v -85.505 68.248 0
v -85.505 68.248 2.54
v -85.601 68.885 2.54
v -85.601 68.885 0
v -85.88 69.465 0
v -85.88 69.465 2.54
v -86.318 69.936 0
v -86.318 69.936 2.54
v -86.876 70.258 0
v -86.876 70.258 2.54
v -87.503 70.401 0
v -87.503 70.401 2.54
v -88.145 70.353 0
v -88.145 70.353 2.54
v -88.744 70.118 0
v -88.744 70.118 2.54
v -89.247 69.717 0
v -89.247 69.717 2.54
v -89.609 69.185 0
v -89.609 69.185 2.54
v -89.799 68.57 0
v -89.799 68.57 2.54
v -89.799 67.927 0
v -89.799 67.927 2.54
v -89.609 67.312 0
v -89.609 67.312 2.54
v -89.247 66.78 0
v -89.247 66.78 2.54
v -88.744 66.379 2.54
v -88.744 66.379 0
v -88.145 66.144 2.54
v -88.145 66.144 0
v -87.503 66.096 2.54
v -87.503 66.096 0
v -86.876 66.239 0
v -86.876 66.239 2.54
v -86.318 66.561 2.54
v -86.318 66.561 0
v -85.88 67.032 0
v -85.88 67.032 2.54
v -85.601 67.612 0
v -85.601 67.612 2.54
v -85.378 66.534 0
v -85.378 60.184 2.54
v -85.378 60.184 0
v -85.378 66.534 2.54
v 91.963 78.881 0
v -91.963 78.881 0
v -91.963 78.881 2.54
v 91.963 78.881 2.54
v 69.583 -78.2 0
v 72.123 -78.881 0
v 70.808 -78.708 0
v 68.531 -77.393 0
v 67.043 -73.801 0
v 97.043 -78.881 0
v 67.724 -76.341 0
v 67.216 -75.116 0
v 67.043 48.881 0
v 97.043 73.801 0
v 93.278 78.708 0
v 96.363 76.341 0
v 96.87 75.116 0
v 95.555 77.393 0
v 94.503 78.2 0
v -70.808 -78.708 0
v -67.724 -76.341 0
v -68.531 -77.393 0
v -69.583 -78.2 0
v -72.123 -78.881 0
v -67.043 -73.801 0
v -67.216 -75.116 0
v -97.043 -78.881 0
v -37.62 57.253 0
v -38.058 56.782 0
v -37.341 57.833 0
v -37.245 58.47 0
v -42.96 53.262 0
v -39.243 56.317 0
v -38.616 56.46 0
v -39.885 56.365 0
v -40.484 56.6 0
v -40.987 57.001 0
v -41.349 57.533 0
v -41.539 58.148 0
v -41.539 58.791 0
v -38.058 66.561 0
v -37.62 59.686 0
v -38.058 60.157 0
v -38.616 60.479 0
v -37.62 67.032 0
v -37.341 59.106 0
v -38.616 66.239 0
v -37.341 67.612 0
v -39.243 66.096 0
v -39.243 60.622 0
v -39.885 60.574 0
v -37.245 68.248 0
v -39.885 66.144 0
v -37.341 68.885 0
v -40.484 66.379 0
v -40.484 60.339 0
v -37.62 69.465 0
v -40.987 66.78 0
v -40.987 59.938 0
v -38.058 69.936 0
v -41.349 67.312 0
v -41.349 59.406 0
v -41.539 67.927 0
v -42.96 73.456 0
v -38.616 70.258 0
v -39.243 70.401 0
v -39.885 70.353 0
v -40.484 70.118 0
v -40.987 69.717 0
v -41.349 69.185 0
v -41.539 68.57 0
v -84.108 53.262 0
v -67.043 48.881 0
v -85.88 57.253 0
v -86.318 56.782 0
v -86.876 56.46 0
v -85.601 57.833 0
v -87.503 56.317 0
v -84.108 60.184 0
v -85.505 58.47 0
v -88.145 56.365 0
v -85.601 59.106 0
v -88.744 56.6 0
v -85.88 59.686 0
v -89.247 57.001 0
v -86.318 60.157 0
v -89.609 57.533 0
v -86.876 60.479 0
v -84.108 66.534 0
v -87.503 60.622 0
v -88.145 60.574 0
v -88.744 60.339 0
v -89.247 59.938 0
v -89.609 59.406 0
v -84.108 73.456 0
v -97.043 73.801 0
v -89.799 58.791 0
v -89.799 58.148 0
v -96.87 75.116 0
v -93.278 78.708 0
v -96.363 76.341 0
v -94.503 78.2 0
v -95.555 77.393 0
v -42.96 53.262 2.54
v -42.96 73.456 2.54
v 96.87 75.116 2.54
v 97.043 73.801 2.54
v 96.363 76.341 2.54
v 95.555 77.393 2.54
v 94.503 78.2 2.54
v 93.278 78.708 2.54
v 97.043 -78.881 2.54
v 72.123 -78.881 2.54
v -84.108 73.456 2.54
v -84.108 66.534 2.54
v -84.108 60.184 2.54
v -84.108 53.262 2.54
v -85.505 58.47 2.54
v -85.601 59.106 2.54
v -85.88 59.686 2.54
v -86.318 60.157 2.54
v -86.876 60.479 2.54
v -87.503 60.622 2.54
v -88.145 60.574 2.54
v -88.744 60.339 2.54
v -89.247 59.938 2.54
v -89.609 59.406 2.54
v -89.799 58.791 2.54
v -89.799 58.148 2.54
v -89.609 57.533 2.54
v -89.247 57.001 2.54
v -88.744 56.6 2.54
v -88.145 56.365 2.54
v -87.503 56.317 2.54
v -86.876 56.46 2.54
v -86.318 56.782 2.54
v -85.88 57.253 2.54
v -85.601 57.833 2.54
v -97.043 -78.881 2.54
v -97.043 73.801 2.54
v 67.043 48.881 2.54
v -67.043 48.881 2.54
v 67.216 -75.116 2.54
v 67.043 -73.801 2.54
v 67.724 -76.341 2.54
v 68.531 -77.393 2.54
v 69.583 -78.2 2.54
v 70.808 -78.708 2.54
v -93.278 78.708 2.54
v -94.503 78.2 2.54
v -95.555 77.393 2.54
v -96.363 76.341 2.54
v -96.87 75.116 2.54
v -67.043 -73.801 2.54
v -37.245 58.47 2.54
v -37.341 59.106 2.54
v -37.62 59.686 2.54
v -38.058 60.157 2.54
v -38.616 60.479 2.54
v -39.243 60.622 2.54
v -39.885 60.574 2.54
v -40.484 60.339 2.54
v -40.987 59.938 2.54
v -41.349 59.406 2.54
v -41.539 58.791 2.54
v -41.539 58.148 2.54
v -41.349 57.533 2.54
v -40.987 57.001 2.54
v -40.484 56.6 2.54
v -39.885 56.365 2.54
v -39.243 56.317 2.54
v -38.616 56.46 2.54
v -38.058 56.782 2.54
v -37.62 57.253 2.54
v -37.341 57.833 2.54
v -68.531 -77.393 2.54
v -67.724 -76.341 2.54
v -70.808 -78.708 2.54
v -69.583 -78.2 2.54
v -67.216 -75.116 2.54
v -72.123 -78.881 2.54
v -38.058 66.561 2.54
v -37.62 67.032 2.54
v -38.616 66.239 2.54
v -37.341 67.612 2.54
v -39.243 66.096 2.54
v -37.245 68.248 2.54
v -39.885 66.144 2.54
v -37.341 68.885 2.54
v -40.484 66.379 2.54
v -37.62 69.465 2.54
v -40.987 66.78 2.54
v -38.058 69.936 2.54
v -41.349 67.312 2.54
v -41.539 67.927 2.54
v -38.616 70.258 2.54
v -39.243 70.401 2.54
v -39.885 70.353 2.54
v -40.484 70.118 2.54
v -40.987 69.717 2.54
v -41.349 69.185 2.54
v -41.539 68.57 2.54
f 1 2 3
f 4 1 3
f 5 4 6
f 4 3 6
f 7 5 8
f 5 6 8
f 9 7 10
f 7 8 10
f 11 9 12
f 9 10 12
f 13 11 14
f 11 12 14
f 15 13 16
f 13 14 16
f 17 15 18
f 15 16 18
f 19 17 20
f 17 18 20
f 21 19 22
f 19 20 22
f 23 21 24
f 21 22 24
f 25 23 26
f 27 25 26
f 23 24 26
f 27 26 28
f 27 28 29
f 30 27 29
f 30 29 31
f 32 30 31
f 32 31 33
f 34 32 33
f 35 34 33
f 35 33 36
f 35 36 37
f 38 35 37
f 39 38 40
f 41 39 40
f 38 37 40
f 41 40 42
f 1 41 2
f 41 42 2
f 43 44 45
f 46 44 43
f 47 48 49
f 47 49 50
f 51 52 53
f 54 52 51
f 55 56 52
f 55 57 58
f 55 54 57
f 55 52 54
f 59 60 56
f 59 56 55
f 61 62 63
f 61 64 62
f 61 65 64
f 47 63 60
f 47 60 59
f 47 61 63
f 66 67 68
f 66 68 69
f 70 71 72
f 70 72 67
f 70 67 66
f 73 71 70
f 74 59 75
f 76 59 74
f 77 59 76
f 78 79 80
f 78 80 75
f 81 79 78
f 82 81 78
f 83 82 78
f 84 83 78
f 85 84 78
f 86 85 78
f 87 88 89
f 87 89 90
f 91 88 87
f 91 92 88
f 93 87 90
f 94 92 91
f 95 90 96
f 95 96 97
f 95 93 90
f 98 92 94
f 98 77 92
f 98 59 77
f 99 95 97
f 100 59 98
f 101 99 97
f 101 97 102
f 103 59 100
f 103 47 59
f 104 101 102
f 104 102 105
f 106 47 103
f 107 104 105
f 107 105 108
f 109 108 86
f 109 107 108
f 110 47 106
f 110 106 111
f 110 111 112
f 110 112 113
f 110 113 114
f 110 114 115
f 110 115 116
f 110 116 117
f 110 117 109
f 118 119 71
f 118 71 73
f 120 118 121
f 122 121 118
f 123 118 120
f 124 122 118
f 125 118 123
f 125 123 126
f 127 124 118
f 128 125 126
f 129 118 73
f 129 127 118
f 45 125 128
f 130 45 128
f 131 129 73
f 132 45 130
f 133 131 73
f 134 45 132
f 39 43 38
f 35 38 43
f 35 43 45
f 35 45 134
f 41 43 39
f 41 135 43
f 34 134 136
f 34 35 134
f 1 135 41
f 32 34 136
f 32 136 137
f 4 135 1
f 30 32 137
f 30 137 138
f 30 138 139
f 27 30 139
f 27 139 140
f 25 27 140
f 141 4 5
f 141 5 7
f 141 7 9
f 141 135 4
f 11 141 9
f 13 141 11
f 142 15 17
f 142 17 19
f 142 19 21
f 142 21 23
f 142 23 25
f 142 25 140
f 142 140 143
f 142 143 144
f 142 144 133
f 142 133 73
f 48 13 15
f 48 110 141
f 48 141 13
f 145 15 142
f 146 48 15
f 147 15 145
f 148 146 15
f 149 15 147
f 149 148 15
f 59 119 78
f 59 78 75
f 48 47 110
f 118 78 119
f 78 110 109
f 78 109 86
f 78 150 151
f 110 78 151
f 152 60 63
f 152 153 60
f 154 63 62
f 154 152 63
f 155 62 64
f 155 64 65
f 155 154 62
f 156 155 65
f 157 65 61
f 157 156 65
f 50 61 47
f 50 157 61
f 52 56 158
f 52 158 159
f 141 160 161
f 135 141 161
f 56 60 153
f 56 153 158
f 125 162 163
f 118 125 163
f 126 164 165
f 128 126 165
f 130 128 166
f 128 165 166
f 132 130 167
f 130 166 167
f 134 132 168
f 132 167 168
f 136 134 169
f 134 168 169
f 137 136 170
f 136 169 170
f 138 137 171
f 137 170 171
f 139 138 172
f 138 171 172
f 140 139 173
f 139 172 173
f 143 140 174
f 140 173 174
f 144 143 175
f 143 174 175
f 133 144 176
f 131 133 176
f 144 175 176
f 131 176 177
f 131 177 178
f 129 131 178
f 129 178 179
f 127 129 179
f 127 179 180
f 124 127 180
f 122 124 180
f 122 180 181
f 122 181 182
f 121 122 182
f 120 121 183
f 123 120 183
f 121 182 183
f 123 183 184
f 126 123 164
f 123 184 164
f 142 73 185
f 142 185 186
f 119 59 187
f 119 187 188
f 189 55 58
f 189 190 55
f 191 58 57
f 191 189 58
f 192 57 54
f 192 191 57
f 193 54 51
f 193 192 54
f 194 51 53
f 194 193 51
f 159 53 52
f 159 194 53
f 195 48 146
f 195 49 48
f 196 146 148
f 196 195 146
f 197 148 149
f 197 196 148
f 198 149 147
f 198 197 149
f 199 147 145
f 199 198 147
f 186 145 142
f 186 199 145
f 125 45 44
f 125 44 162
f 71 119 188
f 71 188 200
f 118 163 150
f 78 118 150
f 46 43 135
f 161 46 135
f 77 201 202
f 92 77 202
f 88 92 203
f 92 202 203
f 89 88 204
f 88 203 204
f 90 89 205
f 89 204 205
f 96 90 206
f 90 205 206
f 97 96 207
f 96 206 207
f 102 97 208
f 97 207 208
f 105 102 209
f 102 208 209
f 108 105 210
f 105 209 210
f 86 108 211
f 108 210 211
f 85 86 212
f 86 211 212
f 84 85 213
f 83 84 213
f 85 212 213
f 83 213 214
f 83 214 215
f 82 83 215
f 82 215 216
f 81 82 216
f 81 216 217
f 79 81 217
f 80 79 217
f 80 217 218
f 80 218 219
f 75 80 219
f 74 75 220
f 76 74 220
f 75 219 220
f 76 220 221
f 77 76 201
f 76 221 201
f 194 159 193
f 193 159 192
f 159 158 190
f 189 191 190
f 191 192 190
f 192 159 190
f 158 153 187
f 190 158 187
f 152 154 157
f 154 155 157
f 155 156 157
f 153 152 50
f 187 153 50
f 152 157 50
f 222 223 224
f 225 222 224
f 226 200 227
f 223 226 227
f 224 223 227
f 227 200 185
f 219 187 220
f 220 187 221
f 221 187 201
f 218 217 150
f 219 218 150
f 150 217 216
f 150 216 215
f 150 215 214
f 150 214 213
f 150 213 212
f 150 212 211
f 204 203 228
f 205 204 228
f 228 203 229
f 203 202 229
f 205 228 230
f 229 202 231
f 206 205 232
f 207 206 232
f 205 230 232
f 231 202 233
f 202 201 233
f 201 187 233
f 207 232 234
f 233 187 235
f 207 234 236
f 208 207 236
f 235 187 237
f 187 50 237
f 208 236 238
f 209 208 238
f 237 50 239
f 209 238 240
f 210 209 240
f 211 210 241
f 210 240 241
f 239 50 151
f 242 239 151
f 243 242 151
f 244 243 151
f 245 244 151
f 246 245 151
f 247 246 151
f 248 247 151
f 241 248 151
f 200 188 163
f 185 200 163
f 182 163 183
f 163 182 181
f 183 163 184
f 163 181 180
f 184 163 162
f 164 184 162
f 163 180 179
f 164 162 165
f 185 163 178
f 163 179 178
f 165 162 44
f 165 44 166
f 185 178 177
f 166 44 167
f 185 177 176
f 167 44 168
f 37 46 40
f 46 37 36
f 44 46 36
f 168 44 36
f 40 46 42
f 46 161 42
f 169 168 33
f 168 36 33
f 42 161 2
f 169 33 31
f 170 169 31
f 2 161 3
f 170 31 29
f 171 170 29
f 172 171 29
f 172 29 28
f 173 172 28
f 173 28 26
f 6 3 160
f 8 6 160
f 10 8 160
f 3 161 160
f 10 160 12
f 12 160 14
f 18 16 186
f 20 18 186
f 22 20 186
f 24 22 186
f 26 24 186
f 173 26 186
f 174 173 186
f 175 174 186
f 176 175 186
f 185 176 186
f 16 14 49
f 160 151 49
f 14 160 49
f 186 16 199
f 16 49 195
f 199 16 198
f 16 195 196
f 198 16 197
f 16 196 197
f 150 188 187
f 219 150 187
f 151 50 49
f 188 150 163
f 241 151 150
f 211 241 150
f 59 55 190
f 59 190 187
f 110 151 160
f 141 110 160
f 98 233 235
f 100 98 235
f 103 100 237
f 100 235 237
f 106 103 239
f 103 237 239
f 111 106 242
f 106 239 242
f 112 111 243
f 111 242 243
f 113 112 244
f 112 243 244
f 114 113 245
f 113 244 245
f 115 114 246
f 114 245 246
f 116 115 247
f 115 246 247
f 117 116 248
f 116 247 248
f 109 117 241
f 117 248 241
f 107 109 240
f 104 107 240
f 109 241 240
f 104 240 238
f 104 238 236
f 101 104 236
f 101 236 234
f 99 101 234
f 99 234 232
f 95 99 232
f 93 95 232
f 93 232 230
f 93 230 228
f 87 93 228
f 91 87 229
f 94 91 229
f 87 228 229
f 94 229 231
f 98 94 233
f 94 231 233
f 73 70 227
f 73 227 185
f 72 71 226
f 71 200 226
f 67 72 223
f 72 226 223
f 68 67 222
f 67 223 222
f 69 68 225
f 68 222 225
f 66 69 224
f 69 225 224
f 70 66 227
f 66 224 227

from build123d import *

# Parameters (mm, degrees)
BOSS_EXTRUDE1_DEPTH = 2.54
SKETCH2_R           = 2.159
CUT_EXTRUDE1_DEPTH  = 2.54
FILLET1_R           = 5.08
SKETCH3_W           = 2.54
SKETCH3_H           = 6.35
CUT_EXTRUDE4_DEPTH  = 3.54


with BuildPart() as part:
    # Sketch1 → Boss-Extrude1 (new body)
    with BuildSketch(Plane.XY):
        Polygon((67.0433, -78.881), (67.0433, 48.881), (-67.0433, 48.881), (-67.0433, -78.881), (-97.0433, -78.881), (-97.0433, 78.881), (97.0433, 78.881), (97.0433, -78.881), align=None)
    extrude(amount=BOSS_EXTRUDE1_DEPTH)

    # Sketch2 → Cut-Extrude1 (cut)
    with BuildSketch(Plane.XY.offset(2.54)):
        with Locations((-87.6643, 68.2485)):
            Circle(SKETCH2_R)
        with Locations((-87.6643, 58.4695)):
            Circle(SKETCH2_R)
        with Locations((-39.4043, 68.2485)):
            Circle(SKETCH2_R)
        with Locations((-39.4043, 58.4695)):
            Circle(SKETCH2_R)
        Polygon((-42.9603, 73.4555), (-84.1083, 73.4555), (-84.1083, 53.2625), (-42.9603, 53.2625), (-42.9603, 63.359), align=None)
    extrude(amount=-CUT_EXTRUDE1_DEPTH, mode=Mode.SUBTRACT)

    # Fillet1
    fillet1_edges = [part.edges().sort_by_distance(p)[0] for p in [
        (-97.0433, 78.881, 1.27),
        (97.0433, 78.881, 1.27),
        (67.0433, -78.881, 1.27),
        (-67.0433, -78.881, 1.27),
    ]]
    fillet(fillet1_edges, radius=FILLET1_R)

    # Sketch3 → Cut-Extrude4 (cut, through all)
    with BuildSketch(Plane.XY.offset(2.54)):
        with Locations((-84.1083, 63.359)):
            Rectangle(SKETCH3_W, SKETCH3_H)
    extrude(amount=-CUT_EXTRUDE4_DEPTH, mode=Mode.SUBTRACT)


solid = part.part
